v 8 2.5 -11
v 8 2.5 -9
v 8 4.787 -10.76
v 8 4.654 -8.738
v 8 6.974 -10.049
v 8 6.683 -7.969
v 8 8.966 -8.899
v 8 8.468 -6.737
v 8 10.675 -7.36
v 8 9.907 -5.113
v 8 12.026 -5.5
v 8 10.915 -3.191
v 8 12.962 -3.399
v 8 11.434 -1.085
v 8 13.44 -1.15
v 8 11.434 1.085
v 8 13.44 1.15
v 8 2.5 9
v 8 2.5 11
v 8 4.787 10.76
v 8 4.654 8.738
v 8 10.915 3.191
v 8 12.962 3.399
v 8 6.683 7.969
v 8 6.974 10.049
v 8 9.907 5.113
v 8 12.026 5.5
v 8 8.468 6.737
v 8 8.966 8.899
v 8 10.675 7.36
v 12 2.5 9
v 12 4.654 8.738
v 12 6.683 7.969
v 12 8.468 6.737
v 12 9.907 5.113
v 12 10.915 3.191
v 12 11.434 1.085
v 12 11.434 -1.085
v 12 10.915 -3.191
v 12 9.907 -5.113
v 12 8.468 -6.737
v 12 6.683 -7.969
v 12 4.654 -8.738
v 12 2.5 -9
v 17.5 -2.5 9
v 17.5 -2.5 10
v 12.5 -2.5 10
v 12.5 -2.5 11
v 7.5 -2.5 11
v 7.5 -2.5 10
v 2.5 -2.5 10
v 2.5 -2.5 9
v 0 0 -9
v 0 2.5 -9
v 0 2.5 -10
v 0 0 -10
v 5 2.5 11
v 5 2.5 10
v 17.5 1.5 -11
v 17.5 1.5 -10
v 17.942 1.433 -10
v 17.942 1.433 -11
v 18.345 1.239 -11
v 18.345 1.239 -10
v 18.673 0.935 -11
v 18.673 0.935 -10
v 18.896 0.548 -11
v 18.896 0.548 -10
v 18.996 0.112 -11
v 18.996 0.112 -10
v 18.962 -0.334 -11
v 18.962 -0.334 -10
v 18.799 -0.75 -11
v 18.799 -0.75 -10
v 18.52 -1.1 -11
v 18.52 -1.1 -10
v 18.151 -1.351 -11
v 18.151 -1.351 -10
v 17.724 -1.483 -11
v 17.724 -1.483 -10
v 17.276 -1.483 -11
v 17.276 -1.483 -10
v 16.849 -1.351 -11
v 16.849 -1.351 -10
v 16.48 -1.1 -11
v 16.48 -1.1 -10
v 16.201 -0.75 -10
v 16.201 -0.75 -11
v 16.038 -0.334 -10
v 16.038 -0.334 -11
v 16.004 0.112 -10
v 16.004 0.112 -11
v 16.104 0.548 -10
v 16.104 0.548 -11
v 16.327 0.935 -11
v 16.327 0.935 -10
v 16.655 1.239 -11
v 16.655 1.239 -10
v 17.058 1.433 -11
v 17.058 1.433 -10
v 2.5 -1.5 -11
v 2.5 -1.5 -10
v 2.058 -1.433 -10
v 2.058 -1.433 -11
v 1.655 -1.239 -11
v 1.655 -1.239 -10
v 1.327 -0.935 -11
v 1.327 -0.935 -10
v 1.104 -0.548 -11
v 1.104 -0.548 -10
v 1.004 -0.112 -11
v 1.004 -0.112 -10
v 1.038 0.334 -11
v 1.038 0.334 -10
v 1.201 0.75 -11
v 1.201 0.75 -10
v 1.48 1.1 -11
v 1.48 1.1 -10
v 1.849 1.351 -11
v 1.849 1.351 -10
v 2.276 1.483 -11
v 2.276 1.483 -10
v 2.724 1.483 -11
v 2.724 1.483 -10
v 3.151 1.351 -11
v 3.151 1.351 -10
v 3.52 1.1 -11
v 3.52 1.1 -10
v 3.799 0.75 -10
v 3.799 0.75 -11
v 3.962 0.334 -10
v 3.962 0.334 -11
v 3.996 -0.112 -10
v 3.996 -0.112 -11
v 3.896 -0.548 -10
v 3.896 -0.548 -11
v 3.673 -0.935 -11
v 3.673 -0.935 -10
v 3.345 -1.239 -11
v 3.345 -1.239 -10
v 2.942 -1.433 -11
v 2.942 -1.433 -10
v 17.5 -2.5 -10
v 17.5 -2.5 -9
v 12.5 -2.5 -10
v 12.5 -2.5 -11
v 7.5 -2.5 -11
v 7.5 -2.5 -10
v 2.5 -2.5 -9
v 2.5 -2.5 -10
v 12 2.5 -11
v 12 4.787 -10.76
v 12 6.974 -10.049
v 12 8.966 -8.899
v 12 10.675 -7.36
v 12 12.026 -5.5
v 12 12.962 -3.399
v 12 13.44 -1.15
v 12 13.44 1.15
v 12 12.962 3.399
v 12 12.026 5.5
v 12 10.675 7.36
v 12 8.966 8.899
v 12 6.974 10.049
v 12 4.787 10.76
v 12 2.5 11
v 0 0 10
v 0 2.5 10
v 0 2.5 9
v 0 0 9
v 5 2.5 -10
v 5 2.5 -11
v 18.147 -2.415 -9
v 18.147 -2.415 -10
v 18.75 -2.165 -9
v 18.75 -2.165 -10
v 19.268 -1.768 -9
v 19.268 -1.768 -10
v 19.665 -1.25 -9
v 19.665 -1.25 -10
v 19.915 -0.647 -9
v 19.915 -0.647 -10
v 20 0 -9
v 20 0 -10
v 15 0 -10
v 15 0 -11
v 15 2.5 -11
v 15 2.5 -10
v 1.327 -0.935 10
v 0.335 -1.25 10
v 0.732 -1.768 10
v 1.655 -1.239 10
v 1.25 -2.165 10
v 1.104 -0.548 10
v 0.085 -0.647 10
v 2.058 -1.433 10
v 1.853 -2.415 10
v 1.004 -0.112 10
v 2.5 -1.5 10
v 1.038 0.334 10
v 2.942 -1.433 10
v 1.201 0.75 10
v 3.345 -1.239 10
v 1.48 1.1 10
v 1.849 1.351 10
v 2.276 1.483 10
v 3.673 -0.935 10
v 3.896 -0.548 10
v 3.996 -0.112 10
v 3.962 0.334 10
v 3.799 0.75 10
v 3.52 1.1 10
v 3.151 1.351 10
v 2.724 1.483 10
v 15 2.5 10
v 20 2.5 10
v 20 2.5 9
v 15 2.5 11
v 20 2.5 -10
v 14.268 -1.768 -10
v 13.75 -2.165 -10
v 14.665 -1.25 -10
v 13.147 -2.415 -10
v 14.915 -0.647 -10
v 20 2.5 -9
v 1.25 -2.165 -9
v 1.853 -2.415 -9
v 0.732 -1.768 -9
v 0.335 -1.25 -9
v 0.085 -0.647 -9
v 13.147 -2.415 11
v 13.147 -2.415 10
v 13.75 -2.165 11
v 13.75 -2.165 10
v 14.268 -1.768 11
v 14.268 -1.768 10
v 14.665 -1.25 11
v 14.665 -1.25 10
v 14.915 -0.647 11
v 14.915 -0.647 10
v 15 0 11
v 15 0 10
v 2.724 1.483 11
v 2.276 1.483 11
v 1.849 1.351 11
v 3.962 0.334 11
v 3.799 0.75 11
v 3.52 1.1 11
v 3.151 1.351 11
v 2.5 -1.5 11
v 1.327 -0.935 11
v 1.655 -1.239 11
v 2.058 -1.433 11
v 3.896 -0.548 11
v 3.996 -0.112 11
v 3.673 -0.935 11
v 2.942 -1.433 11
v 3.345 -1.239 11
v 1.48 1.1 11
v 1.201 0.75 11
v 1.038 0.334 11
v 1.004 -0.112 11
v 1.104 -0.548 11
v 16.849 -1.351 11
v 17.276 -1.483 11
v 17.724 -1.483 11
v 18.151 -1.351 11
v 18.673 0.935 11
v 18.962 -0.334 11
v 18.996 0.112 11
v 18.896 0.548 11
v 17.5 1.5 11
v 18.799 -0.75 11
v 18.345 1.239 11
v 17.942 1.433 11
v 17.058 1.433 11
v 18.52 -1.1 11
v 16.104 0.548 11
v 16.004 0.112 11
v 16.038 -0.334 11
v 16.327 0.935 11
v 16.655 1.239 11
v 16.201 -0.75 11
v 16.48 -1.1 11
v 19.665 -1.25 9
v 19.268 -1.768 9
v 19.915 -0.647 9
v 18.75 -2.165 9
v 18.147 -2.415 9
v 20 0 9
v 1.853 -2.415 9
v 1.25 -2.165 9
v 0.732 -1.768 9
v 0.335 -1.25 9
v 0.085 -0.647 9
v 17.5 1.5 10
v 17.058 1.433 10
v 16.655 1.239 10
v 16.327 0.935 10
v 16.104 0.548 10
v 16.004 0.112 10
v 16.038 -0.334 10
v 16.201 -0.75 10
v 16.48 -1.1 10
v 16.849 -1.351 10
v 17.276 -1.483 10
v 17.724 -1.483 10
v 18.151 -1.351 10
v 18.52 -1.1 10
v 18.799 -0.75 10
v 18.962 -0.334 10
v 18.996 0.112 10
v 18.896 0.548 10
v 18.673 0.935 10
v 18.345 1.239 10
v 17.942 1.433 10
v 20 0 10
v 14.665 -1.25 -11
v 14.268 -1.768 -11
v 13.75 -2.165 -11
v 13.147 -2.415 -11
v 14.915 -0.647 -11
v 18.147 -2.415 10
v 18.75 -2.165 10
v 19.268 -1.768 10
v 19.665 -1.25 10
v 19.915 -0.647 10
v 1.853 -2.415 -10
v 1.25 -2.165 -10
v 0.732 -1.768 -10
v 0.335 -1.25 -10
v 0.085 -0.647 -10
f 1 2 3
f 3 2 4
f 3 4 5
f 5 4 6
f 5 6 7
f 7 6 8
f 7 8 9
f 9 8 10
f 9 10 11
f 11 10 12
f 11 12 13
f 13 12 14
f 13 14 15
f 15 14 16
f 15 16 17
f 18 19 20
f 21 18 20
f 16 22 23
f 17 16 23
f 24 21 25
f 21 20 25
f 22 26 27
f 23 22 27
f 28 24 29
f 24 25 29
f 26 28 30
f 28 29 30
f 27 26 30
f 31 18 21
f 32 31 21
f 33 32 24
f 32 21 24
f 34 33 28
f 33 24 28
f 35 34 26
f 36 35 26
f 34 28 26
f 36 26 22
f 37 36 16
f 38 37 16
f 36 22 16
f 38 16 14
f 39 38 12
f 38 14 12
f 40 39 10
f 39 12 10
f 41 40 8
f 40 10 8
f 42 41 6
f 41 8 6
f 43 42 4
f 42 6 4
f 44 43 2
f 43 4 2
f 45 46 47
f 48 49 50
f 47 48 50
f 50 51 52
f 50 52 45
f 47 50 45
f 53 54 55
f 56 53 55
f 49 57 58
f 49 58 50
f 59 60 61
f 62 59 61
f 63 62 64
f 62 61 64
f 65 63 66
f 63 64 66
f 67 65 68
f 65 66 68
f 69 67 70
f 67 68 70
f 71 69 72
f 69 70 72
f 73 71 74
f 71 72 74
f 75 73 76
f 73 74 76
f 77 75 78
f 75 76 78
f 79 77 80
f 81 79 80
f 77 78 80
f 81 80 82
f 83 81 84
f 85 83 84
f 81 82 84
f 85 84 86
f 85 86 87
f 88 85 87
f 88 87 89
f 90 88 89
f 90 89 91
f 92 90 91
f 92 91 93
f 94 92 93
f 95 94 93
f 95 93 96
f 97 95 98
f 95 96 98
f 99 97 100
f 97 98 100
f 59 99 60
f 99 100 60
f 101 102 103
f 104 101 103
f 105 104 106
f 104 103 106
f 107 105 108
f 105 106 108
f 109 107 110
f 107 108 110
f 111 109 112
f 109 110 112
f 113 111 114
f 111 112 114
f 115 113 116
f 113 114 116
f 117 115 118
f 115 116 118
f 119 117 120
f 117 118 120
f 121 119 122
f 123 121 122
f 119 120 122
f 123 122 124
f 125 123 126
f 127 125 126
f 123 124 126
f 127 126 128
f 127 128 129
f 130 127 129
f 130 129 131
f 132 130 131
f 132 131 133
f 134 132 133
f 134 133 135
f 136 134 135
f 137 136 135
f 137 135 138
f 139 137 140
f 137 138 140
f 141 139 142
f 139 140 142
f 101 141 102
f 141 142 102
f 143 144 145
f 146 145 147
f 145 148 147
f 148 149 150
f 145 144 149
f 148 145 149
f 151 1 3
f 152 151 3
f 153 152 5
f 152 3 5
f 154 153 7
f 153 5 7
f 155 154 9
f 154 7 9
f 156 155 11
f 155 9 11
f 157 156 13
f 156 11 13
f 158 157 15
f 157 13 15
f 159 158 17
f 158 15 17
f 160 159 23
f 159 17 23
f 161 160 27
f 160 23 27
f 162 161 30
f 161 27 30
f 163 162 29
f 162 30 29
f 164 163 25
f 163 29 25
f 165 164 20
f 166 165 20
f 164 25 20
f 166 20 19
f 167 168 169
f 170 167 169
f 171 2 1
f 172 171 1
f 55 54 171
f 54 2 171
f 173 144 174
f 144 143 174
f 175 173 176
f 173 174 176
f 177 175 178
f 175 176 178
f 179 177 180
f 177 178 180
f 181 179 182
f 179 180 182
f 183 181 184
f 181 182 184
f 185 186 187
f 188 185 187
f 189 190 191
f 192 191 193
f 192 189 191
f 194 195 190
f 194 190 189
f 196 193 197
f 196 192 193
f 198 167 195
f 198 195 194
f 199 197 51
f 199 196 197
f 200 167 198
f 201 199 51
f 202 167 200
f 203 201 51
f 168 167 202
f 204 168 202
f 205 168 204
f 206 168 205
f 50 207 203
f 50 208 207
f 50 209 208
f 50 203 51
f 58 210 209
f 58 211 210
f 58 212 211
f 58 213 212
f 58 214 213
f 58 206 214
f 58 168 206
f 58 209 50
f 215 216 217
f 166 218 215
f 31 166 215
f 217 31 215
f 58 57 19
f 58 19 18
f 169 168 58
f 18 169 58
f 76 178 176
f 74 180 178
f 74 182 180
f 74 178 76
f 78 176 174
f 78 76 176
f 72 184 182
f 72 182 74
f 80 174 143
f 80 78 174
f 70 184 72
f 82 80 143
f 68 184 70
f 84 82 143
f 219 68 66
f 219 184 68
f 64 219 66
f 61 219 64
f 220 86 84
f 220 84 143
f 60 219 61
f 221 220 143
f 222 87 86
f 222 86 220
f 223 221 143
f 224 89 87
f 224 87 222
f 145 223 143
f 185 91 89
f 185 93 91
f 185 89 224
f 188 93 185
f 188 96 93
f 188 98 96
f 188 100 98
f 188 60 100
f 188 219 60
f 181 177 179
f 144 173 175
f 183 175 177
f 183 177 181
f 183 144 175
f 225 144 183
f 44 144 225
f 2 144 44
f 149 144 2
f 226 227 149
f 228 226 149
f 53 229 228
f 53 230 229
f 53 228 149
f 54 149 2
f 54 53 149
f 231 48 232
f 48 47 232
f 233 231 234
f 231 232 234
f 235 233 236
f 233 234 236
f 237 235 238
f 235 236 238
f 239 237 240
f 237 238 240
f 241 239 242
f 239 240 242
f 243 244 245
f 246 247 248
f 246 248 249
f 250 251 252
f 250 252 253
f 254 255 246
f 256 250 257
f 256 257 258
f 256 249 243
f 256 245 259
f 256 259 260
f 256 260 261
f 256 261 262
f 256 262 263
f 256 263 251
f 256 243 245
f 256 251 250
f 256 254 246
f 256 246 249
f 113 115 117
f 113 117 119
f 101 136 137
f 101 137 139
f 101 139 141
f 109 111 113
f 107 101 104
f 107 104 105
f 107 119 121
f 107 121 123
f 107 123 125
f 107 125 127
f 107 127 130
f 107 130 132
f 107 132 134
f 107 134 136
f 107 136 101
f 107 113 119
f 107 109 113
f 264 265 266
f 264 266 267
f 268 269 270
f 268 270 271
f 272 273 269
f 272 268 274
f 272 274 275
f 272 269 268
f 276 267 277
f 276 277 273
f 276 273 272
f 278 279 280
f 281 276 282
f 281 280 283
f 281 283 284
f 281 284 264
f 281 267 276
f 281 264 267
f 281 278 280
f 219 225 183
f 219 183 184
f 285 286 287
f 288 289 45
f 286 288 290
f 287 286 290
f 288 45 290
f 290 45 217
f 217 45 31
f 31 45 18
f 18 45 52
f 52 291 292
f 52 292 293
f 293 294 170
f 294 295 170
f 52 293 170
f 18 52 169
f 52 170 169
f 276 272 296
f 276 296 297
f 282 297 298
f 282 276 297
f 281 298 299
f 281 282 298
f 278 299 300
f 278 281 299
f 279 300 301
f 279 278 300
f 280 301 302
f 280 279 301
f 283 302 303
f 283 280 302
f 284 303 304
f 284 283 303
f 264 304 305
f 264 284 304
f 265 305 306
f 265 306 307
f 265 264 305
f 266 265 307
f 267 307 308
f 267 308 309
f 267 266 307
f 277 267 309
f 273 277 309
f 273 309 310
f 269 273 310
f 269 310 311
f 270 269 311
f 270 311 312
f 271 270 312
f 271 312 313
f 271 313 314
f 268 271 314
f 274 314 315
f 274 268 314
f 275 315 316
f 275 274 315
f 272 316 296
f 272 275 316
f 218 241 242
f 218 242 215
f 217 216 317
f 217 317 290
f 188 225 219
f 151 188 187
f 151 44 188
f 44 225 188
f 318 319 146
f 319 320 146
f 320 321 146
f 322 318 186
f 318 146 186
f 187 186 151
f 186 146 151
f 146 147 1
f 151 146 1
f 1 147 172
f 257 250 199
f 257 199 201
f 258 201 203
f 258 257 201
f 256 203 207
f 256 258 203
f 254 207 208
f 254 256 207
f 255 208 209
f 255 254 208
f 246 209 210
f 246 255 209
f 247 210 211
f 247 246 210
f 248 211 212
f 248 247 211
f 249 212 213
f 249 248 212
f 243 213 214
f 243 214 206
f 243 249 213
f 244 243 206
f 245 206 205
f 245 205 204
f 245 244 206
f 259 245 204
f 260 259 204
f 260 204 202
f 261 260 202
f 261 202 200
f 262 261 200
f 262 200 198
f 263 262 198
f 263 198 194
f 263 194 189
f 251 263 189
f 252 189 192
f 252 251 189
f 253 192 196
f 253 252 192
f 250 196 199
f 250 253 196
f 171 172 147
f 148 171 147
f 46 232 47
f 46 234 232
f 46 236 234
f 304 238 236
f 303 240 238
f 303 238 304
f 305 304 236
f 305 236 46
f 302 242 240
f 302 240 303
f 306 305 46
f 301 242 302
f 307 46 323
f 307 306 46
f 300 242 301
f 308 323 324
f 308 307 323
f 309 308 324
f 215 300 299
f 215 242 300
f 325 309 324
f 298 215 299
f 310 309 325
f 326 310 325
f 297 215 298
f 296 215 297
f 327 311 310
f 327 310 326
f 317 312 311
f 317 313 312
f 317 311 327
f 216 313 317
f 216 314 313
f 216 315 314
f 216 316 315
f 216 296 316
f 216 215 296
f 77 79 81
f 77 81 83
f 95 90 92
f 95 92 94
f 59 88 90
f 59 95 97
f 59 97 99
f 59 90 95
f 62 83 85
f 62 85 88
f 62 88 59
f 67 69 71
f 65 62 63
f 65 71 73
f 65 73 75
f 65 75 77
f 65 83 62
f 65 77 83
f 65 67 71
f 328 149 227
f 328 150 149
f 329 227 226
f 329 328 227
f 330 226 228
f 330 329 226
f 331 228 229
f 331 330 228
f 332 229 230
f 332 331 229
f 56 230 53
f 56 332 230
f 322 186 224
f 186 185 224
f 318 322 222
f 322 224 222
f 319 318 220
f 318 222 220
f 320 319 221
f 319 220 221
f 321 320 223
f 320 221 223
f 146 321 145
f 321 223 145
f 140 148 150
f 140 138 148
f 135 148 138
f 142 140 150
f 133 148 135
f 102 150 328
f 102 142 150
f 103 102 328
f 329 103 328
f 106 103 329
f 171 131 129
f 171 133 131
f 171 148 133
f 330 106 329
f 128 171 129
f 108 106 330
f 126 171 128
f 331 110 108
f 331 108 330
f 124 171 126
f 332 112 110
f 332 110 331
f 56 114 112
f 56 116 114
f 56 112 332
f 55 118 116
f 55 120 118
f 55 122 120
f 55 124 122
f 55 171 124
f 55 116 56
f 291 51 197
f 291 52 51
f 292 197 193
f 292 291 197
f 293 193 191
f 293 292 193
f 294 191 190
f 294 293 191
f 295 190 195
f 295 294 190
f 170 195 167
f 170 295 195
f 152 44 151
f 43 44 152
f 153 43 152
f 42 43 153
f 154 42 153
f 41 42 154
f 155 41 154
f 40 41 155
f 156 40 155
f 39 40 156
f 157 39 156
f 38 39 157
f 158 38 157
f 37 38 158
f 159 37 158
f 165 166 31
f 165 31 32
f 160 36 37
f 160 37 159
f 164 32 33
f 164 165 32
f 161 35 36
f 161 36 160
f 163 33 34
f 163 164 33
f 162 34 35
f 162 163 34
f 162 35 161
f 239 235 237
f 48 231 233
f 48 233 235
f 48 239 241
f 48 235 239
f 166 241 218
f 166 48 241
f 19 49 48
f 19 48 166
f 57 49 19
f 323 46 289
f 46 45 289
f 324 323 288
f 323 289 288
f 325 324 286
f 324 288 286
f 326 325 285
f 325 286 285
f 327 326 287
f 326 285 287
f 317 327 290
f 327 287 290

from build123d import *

# Parameters (mm, degrees)
SKETCH3_W             = 2
SKETCH3_H             = 5
BOSS_EXTRUDE1_DEPTH   = 20
BOSS_EXTRUDE1_2_DEPTH = 20
SKETCH4_W             = 5
SKETCH4_H             = 5
CUT_EXTRUDE1_DEPTH    = 1
SKETCH5_W             = 5
SKETCH5_H             = 5
CUT_EXTRUDE2_DEPTH    = 1
SWEEP1_START          = 8
SWEEP1_DEPTH          = 4
SKETCH7_R             = 1.5
BOSS_EXTRUDE2_DEPTH   = 1
BOSS_EXTRUDE3_START   = 1
SKETCH8_R             = 1.5
BOSS_EXTRUDE3_DEPTH   = 1
FILLET1_R             = 2.5
CUT_EXTRUDE3_DEPTH    = 1
CUT_EXTRUDE4_DEPTH    = 1
FILLET2_R             = 2.5


# Read off the part's stored shape, not the designer's step: Sweep1
with BuildPart() as part:
    # Sketch3 → Boss-Extrude1 (new body)
    with BuildSketch(Plane(origin=(0, 0, 0), x_dir=(0, 0, -1), z_dir=(1, 0, 0))):
        with Locations((-10, 0)):
            Rectangle(SKETCH3_W, SKETCH3_H)
    extrude(amount=BOSS_EXTRUDE1_DEPTH)

    # Sketch4 → Cut-Extrude1 (cut)
    with BuildSketch(Plane.XY.offset(11)):
        with Locations((2.5, 0)):
            Rectangle(SKETCH4_W, SKETCH4_H)
        with Locations((17.5, 0)):
            Rectangle(SKETCH4_W, SKETCH4_H)
    extrude(amount=-CUT_EXTRUDE1_DEPTH, mode=Mode.SUBTRACT)



with BuildPart() as body_2:
    # Sketch3 → Boss-Extrude1 2 (new body)
    with BuildSketch(Plane(origin=(0, 0, 0), x_dir=(0, 0, -1), z_dir=(1, 0, 0))):
        with Locations((10, 0)):
            Rectangle(SKETCH3_W, SKETCH3_H)
    extrude(amount=BOSS_EXTRUDE1_2_DEPTH)

    # Sketch5 → Cut-Extrude2 (cut)
    with BuildSketch(Plane(origin=(0, 0, -11), x_dir=(-1, 0, 0), z_dir=(0, 0, -1))):
        with Locations((-17.5, 0)):
            Rectangle(SKETCH5_W, SKETCH5_H)
        with Locations((-2.5, 0)):
            Rectangle(SKETCH5_W, SKETCH5_H)
    extrude(amount=-CUT_EXTRUDE2_DEPTH, mode=Mode.SUBTRACT)


with BuildPart() as part_1:
    add(part.part)

    add(body_2.part)  # Sweep1 merges body 2
    # Sweep1 outline → Sweep1 (add)
    with BuildSketch(Plane.YZ.offset(SWEEP1_START)):
        with BuildLine():
            Line((2.5, -9), (2.5, -11))
            ThreePointArc((2.5, -11), (13.5, 0), (2.5, 11))
            Line((2.5, 11), (2.5, 9))
            ThreePointArc((2.5, 9), (11.5, 0), (2.5, -9))
        make_face()
    extrude(amount=SWEEP1_DEPTH)

    # Sketch7 → Boss-Extrude2 (add)
    with BuildSketch(Plane(origin=(0, 0, -10), x_dir=(-1, 0, 0), z_dir=(0, 0, -1))):
        with Locations(Location((-2.5, 0, 0), (0, 0, 270))):
            Circle(SKETCH7_R)
        with Locations(Location((-17.5, 0, 0), (0, 0, 90))):
            Circle(SKETCH7_R)
    extrude(amount=BOSS_EXTRUDE2_DEPTH)

    # Sketch8 → Boss-Extrude3 (add)
    with BuildSketch(Plane.XY.offset(10).offset(BOSS_EXTRUDE3_START)):
        with Locations(Location((17.5, 0, 0), (0, 0, 90))):
            Circle(SKETCH8_R)
        with Locations(Location((2.5, 0, 0), (0, 0, 270))):
            Circle(SKETCH8_R)
    extrude(amount=-BOSS_EXTRUDE3_DEPTH)

    # Fillet1
    fillet1_edges = [part_1.edges().sort_by_distance(p)[0] for p in [
        (0, -2.5, 9.5),
        (20, -2.5, 9.5),
        (20, -2.5, -9.5),
        (0, -2.5, -9.5),
    ]]
    fillet(fillet1_edges, radius=FILLET1_R)

    # Sketch9 → Cut-Extrude3 (cut)
    with BuildSketch(Plane.XY.offset(11)):
        Polygon((5, 2.5), (7.5, -2.5), (5, -2.5), align=None)
    extrude(amount=-CUT_EXTRUDE3_DEPTH, mode=Mode.SUBTRACT)

    # Sketch10 → Cut-Extrude4 (cut)
    with BuildSketch(Plane(origin=(0, 0, -11), x_dir=(-1, 0, 0), z_dir=(0, 0, -1))):
        Polygon((-5, 2.5), (-7.5, -2.5), (-5, -2.5), align=None)
    extrude(amount=-CUT_EXTRUDE4_DEPTH, mode=Mode.SUBTRACT)

    # Fillet2
    fillet2_edges = [part_1.edges().sort_by_distance(p)[0] for p in [
        (15, -2.5, 10.5),
        (15, -2.5, -10.5),
    ]]
    fillet(fillet2_edges, radius=FILLET2_R)


solid = part_1.part
